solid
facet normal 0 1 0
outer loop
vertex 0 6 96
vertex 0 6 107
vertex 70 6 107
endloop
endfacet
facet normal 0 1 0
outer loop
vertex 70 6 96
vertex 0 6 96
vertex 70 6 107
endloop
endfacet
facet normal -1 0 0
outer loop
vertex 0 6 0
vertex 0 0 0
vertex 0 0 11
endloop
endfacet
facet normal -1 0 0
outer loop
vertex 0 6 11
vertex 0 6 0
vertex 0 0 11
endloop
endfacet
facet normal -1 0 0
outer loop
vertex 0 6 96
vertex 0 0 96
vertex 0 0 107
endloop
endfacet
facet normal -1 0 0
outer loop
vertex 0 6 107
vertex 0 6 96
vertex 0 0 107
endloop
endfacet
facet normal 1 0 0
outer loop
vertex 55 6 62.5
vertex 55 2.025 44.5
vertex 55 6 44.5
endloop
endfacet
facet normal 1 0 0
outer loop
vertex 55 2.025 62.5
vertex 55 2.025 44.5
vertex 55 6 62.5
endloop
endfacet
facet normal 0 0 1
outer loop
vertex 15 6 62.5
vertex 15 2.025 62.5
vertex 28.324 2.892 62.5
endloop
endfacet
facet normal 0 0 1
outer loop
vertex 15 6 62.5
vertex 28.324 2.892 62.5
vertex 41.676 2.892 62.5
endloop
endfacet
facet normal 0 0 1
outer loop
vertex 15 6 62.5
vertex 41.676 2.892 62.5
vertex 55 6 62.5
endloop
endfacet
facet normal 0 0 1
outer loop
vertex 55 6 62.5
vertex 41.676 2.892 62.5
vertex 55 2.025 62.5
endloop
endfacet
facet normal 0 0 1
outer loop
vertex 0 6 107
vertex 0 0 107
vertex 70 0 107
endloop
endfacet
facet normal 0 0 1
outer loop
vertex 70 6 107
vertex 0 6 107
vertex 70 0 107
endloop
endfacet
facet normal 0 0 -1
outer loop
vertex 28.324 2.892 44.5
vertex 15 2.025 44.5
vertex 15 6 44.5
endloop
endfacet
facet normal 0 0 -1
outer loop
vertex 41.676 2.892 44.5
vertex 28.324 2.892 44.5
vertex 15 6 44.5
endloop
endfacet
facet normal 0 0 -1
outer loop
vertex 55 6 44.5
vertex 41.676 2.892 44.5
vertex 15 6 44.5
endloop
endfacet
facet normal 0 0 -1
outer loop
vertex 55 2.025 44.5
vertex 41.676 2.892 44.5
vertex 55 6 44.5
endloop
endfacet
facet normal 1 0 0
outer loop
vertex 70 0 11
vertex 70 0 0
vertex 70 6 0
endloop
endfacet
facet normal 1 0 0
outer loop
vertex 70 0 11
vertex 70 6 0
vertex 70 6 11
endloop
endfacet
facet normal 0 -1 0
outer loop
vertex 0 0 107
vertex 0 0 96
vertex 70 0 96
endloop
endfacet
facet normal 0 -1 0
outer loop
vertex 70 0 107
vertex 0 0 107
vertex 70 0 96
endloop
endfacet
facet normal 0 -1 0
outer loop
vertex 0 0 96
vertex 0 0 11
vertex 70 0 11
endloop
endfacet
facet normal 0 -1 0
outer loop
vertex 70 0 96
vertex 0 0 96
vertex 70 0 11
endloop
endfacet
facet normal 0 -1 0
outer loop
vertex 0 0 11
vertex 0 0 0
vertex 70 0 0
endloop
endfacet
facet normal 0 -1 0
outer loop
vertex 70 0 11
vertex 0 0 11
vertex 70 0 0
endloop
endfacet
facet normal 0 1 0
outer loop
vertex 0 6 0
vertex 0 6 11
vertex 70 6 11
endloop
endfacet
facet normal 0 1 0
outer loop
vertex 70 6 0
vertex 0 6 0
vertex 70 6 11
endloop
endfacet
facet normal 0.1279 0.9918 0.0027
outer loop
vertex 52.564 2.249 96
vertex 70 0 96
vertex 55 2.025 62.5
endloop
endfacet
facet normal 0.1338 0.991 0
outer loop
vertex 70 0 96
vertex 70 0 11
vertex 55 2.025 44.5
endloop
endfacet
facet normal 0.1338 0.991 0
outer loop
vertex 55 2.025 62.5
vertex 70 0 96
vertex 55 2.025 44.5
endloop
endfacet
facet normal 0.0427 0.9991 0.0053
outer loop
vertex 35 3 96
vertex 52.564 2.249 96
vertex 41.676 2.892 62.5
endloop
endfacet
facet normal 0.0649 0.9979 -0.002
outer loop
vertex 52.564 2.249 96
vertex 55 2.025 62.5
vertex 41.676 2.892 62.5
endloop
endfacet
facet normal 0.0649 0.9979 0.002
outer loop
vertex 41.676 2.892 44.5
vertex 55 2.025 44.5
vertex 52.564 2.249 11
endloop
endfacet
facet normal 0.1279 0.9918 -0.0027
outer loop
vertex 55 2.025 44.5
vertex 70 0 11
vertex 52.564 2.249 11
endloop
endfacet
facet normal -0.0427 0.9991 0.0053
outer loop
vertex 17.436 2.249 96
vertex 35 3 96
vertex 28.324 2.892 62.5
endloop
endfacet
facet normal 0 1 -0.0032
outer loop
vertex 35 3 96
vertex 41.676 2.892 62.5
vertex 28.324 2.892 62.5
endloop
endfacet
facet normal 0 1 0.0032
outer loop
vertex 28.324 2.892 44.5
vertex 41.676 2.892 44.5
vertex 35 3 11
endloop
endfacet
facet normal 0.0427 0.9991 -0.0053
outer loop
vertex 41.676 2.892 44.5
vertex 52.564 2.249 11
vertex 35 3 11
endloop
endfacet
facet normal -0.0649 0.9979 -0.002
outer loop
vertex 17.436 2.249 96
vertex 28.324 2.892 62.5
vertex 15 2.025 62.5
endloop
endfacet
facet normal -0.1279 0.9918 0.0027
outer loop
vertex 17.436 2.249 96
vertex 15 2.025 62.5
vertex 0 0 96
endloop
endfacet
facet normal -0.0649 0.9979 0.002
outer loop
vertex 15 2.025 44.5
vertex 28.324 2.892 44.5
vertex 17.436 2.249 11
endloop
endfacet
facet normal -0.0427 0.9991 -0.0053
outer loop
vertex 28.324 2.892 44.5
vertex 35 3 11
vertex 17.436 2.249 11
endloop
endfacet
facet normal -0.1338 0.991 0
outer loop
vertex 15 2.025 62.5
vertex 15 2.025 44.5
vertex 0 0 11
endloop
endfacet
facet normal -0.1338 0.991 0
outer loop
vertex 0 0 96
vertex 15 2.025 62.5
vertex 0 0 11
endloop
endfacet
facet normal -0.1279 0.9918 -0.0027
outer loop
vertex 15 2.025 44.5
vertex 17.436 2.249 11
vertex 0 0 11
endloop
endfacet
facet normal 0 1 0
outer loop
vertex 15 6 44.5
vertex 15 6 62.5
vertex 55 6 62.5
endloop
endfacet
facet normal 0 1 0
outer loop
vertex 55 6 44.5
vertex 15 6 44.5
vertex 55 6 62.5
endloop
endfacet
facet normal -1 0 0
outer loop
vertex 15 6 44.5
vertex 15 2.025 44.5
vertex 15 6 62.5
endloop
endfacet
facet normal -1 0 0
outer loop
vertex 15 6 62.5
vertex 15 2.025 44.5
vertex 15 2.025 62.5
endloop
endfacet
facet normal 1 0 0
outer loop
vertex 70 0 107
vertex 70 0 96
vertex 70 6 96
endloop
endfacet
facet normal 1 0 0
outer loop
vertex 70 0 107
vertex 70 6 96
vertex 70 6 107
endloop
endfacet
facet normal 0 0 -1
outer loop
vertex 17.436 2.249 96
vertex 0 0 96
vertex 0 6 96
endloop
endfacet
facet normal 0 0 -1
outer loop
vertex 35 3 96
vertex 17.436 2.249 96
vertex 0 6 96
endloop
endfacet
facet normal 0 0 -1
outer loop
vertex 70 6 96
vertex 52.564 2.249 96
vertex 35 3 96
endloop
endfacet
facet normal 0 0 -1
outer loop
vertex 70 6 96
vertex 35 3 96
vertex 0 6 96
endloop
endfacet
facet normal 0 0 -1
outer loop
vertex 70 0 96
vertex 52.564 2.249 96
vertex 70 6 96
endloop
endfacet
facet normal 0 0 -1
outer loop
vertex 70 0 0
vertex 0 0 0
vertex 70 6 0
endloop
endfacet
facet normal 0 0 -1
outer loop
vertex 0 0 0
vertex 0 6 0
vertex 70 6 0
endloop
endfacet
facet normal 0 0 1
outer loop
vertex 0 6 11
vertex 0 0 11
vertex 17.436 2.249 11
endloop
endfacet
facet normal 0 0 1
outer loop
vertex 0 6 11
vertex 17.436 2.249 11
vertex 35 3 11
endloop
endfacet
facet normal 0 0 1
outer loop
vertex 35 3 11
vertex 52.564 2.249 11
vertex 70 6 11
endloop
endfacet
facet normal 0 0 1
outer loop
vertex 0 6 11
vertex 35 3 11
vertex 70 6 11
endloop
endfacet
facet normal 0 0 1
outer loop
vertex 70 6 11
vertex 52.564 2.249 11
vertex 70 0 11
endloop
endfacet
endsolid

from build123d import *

# Parameters (mm, degrees)
F1_DEPTH = 107
F2_W     = 70
F2_H     = 11
F2_W_2   = 40
F2_H_2   = 18
F3_DEPTH = 6


with BuildPart() as f1:
    # F0 (on Top) → F1 (new body)
    with BuildSketch(Plane.XY):
        with BuildLine():
            Line((0, 0), (70, 0))
            ThreePointArc((70, 0), (35, 3), (0, 0))
        make_face()
    extrude(amount=F1_DEPTH)

    # F2 (on face) → F3 (join)
    with BuildSketch(Plane.XZ):
        with Locations((35, 101.5)):
            Rectangle(F2_W, F2_H)
        with Locations((35, 53.5)):
            Rectangle(F2_W_2, F2_H_2)
        with Locations((35, 5.5)):
            Rectangle(F2_W, F2_H)
    extrude(amount=-F3_DEPTH)


solid = f1.part
